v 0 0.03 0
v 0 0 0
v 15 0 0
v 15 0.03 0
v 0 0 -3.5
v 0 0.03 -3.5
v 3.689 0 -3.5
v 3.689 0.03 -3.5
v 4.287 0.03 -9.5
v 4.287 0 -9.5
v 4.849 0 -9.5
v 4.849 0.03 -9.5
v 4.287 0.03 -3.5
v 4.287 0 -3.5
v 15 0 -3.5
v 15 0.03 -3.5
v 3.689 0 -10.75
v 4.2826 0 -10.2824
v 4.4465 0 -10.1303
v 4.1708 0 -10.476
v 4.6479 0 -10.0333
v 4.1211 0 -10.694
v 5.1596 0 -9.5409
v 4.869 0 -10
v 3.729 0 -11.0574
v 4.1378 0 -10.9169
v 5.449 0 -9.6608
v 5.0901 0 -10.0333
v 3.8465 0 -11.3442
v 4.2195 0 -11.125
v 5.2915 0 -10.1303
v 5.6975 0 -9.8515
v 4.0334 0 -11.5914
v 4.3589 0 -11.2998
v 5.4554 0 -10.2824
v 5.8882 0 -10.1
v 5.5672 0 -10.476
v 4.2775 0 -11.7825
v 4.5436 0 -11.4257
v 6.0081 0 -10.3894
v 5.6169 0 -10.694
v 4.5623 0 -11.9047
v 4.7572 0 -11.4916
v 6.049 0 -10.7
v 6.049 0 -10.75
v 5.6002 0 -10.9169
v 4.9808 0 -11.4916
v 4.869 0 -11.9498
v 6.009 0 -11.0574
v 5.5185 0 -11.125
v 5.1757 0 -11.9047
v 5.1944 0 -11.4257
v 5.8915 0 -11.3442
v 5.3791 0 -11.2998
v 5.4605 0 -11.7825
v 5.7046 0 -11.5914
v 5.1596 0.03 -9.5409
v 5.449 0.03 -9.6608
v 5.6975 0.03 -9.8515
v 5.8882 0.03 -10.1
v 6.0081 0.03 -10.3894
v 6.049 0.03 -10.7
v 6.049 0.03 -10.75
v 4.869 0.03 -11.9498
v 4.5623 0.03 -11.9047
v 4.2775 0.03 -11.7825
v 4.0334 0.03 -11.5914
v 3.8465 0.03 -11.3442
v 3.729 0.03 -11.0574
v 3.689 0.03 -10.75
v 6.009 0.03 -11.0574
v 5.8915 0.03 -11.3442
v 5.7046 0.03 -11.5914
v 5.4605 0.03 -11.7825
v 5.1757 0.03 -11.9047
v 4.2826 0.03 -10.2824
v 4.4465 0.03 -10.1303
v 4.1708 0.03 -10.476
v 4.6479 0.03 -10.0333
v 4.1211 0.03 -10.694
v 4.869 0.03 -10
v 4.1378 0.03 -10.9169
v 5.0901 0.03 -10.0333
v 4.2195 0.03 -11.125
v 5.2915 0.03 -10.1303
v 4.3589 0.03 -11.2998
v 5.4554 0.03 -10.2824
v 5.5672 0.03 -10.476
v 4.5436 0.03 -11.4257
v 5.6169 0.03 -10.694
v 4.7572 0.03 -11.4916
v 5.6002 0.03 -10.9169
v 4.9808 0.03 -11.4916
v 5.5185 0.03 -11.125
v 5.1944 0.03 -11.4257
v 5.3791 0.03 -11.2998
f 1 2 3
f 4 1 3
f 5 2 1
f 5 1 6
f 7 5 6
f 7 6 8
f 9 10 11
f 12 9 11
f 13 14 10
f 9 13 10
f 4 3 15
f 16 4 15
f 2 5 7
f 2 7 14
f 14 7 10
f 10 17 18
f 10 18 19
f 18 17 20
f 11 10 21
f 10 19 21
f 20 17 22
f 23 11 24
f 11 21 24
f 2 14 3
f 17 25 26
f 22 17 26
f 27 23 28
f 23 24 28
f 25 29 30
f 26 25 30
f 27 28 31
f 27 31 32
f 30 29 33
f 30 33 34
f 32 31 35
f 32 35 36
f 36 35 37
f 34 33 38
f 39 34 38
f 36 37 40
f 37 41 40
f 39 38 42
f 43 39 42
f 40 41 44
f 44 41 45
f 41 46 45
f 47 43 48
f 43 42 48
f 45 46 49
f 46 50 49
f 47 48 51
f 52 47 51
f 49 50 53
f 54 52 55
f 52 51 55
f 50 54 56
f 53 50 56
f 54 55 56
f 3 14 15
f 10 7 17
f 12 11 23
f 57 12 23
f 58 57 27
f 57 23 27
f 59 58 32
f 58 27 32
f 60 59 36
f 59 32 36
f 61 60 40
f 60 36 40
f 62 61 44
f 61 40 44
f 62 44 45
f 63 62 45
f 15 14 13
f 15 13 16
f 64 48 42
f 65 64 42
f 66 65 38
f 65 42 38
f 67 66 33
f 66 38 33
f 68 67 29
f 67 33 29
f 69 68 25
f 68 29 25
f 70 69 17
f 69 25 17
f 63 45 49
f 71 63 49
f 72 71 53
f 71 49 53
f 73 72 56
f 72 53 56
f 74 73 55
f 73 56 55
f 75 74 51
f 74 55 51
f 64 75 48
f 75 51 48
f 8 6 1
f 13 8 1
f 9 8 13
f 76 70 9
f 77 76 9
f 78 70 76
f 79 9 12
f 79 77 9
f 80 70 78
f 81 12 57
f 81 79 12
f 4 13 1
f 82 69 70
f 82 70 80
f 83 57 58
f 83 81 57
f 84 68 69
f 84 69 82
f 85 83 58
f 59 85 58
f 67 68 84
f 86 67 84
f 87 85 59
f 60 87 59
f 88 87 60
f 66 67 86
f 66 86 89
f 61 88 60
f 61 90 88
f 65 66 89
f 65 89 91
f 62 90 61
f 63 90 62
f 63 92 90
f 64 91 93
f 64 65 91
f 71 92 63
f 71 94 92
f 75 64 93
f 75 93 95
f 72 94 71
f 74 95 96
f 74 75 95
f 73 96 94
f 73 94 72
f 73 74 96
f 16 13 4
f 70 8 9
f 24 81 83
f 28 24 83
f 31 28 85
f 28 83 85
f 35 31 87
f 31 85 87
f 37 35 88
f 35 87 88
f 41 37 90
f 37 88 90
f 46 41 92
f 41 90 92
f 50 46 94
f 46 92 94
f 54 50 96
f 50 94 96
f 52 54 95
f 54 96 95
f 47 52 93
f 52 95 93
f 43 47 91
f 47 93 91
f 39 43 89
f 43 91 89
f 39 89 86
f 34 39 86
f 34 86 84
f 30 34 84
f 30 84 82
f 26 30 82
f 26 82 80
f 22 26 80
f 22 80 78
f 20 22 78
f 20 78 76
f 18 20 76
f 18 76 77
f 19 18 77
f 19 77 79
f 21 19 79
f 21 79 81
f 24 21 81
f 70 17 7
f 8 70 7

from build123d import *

# Parameters (mm, degrees)
SKETCH1_W           = 15
SKETCH1_H           = 3.5
SKETCH1_W_2         = 0.598
SKETCH1_H_2         = 6
BOSS_EXTRUDE1_DEPTH = 0.03
FILLET1_R           = 1.2
SKETCH2_R           = 0.75
CUT_EXTRUDE1_DEPTH  = 1


with BuildPart() as part:
    # Sketch1 → Boss-Extrude1 (new body)
    with BuildSketch(Plane(origin=(0, 0, 0), x_dir=(1, 0, 0), z_dir=(0, 1, 0))):
        with Locations((7.5, 1.75)):
            Rectangle(SKETCH1_W, SKETCH1_H)
        with Locations((3.988, 6.5)):
            Rectangle(SKETCH1_W_2, SKETCH1_H_2)
        Polygon((3.689, 11.95), (3.689, 9.5), (4.287, 9.5), (6.049, 9.5), (6.049, 11.95), align=None)
    extrude(amount=BOSS_EXTRUDE1_DEPTH)

    # Fillet1
    # the kernel refuses this fillet: 1.2 mm, written as the material it takes off along each edge
    with BuildSketch(Plane(origin=(3.689, -3, -11.95), x_dir=(0, 0, 1), z_dir=(0, 1, 0)), Plane(origin=(6.049, -3, -11.95), x_dir=(-1, 0, 0), z_dir=(0, 1, 0)), Plane(origin=(6.049, -3, -9.5), x_dir=(0, 0, -1), z_dir=(0, 1, 0))) as fillet1_piece_1:
        with BuildLine():
            CenterArc((FILLET1_R, FILLET1_R), FILLET1_R, 180, 90)
            Line((0, FILLET1_R), (0, 0))
            Line((0, 0), (FILLET1_R, 0))
        make_face()
    extrude(amount=6.03, mode=Mode.SUBTRACT)

    # Sketch2 → Cut-Extrude1 (cut)
    with BuildSketch(Plane(origin=(0, 0.03, 0), x_dir=(1, 0, 0), z_dir=(0, 1, 0))):
        with Locations(Location((4.869, 10.75, 0), (0, 0, 270))):
            Circle(SKETCH2_R)
    extrude(amount=-CUT_EXTRUDE1_DEPTH, mode=Mode.SUBTRACT)


solid = part.part
